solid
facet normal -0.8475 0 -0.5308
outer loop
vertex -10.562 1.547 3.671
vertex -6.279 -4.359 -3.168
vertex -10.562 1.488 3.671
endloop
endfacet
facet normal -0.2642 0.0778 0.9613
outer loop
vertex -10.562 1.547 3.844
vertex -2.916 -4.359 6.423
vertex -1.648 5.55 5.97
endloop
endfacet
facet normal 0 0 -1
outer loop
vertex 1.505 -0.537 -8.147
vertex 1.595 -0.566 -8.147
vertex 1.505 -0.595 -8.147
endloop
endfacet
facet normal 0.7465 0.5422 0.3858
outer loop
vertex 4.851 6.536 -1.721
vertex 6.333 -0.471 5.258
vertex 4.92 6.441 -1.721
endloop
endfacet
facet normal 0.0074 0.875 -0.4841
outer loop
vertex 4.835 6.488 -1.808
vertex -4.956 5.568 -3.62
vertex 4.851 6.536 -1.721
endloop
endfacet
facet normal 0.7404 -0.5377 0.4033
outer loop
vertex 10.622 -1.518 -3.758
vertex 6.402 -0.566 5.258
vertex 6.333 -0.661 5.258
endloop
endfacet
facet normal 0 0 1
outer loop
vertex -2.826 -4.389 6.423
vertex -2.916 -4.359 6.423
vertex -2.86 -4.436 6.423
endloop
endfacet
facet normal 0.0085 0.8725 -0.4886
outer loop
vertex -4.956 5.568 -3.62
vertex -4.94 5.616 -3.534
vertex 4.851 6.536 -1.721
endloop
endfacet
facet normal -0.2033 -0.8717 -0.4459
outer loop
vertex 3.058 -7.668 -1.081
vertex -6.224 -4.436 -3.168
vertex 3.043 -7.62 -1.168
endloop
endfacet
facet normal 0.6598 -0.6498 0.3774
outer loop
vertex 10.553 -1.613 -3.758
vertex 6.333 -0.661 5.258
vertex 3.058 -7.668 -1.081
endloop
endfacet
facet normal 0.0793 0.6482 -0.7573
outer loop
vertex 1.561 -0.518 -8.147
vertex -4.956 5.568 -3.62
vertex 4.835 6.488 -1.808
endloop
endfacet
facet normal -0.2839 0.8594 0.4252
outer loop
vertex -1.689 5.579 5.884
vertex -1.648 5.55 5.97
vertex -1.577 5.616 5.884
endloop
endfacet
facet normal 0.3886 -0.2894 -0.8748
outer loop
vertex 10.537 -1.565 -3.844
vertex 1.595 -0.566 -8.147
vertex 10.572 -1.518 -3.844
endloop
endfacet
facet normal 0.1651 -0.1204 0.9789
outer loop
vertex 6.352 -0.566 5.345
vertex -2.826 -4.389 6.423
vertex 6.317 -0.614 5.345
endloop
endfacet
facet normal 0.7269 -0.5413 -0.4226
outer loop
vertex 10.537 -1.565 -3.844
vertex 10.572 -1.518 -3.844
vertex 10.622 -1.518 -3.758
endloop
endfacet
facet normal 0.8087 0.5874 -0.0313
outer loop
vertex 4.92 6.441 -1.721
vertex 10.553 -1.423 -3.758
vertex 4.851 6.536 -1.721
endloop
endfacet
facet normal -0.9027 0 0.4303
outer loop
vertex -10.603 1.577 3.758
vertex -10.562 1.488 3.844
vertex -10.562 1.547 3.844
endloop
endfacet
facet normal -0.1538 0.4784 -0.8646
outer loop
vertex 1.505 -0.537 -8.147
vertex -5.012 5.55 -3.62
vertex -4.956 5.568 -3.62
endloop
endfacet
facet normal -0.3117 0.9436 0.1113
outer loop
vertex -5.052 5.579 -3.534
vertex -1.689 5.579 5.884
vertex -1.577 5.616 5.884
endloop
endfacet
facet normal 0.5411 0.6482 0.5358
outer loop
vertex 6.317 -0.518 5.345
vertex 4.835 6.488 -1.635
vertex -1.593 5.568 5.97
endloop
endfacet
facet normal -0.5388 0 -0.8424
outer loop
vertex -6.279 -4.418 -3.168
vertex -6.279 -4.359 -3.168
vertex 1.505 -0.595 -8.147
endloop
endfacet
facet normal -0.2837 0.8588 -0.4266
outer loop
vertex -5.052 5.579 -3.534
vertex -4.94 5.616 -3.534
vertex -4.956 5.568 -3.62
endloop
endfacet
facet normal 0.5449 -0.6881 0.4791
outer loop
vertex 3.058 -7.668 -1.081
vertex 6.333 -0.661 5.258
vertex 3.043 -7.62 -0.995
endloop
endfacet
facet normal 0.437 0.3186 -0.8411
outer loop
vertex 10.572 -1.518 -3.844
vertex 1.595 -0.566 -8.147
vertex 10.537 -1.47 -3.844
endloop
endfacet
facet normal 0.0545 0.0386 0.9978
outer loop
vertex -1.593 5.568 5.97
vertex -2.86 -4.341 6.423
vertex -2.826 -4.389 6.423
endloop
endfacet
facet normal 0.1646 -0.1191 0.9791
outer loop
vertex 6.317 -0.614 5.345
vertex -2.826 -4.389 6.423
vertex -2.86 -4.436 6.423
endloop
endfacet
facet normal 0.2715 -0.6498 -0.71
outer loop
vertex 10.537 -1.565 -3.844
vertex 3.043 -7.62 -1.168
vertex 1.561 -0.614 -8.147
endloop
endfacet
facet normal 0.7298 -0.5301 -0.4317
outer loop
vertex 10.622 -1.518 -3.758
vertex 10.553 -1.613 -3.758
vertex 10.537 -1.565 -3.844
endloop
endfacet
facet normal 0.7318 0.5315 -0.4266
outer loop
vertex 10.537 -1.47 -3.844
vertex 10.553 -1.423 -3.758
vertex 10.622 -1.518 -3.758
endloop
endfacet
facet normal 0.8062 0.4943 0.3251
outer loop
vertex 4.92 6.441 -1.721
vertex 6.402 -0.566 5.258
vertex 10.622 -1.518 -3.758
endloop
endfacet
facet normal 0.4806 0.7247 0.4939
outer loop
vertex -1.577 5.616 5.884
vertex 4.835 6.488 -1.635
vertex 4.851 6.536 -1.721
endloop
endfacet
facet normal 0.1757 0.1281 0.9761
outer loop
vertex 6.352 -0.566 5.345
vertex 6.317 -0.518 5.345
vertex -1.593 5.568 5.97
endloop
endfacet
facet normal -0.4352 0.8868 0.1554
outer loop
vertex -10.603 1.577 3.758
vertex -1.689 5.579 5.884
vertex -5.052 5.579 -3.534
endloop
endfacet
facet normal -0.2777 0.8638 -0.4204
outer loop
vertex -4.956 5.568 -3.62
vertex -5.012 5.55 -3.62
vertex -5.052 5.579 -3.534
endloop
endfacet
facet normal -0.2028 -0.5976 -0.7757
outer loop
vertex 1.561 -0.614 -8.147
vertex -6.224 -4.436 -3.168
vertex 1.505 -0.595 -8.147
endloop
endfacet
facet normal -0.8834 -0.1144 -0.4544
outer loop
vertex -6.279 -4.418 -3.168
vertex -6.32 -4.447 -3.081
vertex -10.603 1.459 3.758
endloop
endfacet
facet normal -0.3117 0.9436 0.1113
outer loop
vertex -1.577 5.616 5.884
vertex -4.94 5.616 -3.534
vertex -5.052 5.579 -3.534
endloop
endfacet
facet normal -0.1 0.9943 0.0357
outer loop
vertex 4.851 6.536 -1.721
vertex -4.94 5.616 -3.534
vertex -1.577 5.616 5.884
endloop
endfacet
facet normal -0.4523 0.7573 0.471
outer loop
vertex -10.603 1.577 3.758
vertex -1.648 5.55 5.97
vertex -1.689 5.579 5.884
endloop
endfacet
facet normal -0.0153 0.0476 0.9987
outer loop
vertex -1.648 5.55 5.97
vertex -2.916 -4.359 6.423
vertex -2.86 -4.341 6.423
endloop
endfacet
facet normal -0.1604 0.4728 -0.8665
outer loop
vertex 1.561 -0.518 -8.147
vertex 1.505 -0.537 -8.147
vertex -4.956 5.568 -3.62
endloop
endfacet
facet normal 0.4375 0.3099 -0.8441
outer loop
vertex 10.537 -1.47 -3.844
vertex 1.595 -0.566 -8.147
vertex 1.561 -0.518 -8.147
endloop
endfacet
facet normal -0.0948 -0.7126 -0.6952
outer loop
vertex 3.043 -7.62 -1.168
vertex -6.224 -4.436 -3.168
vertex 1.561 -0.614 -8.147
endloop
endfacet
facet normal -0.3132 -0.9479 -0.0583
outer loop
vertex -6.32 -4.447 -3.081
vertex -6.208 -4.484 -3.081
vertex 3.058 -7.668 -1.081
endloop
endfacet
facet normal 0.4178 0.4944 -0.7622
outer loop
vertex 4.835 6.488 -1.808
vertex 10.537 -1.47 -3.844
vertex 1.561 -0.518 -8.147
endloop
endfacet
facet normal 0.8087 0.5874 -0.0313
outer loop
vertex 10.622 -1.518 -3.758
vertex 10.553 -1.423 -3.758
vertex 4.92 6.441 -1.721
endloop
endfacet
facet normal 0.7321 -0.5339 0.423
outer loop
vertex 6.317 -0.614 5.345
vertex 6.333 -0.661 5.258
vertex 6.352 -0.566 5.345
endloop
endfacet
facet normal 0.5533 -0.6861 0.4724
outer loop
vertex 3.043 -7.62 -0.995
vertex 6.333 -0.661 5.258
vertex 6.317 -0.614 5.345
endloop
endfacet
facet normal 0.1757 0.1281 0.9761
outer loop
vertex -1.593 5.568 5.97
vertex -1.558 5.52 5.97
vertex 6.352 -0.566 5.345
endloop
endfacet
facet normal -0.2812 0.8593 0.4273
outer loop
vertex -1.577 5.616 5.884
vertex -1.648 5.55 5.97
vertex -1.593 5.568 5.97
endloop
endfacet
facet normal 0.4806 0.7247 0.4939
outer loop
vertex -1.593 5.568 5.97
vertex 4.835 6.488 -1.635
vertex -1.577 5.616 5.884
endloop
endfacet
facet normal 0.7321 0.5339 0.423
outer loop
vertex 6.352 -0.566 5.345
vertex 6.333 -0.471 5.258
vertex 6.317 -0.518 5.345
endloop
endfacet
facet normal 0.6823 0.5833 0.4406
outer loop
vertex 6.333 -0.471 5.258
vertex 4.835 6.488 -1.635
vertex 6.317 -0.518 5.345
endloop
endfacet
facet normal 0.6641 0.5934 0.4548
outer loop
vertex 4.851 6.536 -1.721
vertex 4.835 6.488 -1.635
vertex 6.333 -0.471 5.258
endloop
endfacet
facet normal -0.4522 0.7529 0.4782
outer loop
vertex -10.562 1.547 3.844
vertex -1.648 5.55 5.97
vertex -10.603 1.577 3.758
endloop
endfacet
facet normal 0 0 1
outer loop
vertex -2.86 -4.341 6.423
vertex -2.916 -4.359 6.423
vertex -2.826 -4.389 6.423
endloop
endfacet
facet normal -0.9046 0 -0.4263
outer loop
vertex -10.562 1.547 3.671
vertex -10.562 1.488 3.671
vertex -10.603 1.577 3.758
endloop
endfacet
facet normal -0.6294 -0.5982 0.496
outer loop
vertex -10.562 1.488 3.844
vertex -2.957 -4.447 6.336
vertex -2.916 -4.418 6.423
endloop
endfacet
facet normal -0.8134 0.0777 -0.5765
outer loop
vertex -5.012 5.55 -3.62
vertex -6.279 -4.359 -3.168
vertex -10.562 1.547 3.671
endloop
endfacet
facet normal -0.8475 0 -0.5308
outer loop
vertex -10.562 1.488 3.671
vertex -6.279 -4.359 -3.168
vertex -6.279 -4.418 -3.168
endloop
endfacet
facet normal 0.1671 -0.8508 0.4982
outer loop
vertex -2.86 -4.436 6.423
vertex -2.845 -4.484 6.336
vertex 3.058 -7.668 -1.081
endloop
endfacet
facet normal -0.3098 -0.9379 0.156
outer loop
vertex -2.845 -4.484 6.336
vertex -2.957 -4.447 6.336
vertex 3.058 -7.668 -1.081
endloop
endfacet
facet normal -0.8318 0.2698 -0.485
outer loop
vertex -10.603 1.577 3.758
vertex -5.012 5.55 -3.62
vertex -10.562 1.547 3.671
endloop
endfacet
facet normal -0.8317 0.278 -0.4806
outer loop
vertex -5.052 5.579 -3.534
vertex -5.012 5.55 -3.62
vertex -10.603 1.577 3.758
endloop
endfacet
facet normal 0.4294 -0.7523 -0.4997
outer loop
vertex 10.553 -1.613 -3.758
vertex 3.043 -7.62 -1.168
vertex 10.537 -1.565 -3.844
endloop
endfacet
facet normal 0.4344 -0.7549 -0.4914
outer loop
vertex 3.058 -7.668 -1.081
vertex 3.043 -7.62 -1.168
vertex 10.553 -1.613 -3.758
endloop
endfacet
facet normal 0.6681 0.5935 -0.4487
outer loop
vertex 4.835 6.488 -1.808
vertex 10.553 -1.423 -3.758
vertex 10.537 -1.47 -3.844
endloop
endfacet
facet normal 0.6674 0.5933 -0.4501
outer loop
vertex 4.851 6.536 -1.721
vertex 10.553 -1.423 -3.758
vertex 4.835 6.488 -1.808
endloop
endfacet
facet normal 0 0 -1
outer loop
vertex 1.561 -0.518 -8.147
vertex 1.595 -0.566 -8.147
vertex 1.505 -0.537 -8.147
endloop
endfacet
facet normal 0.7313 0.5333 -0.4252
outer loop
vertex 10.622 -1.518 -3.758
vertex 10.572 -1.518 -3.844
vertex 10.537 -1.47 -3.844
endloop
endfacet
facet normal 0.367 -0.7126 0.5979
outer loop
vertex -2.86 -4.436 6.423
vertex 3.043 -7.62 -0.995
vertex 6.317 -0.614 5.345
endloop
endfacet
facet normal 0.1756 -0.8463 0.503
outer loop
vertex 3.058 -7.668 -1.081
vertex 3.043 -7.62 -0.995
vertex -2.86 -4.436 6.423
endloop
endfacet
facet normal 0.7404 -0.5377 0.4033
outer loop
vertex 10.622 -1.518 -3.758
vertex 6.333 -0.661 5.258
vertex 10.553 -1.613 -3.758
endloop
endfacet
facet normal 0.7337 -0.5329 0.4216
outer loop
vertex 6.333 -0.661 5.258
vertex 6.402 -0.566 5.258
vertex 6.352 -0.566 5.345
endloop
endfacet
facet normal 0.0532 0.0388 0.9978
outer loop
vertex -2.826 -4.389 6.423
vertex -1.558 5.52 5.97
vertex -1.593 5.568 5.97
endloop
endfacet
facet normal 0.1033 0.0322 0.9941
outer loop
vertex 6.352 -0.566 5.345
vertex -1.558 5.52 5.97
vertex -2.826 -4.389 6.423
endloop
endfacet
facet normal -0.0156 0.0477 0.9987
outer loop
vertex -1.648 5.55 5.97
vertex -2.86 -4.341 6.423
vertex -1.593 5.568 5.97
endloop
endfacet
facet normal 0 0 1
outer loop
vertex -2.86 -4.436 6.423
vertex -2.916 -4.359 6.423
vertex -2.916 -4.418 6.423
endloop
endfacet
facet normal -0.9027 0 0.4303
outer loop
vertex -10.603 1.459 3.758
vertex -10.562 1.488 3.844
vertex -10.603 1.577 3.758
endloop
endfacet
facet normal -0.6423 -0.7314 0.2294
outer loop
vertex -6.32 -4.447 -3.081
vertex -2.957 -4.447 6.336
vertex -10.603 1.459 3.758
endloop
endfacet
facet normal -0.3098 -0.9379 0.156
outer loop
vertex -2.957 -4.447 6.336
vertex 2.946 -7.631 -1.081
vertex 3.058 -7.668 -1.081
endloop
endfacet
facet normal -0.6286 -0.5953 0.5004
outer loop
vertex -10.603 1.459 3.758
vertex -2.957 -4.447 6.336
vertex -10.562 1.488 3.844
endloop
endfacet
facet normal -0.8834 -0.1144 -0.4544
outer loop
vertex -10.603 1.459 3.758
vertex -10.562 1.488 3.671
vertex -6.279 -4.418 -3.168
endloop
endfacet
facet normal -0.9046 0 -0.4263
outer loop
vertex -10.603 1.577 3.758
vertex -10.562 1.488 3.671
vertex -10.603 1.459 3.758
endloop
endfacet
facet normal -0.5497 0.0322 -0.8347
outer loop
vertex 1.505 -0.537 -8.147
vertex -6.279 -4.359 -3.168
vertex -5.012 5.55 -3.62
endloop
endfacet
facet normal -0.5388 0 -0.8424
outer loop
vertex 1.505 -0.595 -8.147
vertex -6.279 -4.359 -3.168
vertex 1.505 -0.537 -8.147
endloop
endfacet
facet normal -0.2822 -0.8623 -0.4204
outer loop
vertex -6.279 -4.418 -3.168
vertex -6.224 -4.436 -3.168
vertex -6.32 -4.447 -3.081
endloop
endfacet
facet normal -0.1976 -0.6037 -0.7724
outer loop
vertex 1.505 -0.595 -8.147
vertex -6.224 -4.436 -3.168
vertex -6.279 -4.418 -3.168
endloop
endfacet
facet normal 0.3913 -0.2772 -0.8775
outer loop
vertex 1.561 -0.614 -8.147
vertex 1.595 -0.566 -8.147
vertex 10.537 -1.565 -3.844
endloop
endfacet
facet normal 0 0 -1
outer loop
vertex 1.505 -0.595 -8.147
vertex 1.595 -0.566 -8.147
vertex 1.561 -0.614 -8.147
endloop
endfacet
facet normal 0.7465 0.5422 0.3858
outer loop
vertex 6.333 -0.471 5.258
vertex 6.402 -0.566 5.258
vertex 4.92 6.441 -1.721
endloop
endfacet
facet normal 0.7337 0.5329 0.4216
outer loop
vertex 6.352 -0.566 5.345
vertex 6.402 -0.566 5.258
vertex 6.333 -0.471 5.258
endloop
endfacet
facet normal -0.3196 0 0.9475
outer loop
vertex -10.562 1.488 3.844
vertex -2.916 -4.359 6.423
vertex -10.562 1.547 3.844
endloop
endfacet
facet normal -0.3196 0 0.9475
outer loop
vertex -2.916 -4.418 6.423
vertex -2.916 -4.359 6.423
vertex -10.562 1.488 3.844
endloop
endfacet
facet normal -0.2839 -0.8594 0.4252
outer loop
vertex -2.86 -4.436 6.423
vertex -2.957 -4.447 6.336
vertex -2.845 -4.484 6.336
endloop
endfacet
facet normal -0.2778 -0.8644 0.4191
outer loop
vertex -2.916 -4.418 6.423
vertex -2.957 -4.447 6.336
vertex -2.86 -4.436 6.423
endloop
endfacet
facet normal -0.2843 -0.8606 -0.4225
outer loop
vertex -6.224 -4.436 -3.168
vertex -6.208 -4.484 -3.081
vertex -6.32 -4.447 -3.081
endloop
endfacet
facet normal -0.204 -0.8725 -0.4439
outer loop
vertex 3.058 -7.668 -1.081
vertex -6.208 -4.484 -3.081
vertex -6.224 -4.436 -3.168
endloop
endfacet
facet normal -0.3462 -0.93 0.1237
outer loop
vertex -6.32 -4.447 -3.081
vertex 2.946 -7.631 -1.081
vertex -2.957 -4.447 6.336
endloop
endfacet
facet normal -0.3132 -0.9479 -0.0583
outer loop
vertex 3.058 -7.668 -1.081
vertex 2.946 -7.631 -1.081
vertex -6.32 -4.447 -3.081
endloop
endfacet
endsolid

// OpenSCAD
// Auto-generated OpenSCAD file

    inner_points = 10*[[-0.2875681422808816, -0.4388544353225138, 0.6336308416100959], [-0.4971338823635884, 0.5520446776359796, -0.35338544423409335], [-0.1608031538888441, 0.5520446776359754, 0.5883584918141553], [-0.6238988707556259, -0.4388544353225094, -0.30811309443815277], [0.630172751148139, -0.056595121156739626, 0.5257908246330256], [0.3027146294131922, -0.7572666034014188, -0.10811031314704228], [0.4819873952312796, 0.6440763610879459, -0.17213508422896023], [0.1545292734963328, -0.05659512115673354, -0.8060362220090282], [-1.0522041318881028, 0.15177639015982886, 0.3757800487328346], [1.0522041318881037, -0.15177639015983246, -0.3757800487328346]];

    outer_points = 10*[[0.6301727511481393, -0.05659512115673544, 0.5257908246330251], [0.15452927349633117, -0.05659512115673544, -0.8060362220090281], [0.30271462941319155, -0.7572666034014177, -0.10811031314703921], [0.481987395231279, 0.6440763610879467, -0.1721350842289639], [-0.28756814228088123, -0.438854435322509, 0.6336308416100982], [-0.16080315388884367, 0.5520446776359799, 0.5883584918141529], [-0.6238988707556268, -0.438854435322509, -0.3081130944381499], [-0.49713388236358924, 0.5520446776359799, -0.3533854442340952], [1.0522041318881026, -0.15177639015983246, -0.3757800487328353], [-1.0522041318881026, 0.15177639015983246, 0.3757800487328353]];

    // Convex hull for inner set (I)
    module inner_hull() {
        hull() {
            for (p = inner_points) {
                translate(p) sphere(r=0.1);
            }
        }
    }

    // Convex hull for outer set (O) minus inner hull (O \ I)
    module outer_minus_inner() {
        difference() {
            hull() {
                for (p = outer_points) {
                    translate(p) sphere(r=0.1);
                }
            }
            inner_hull(); // Subtract inner hull
        }
    }

    // Convex hull for outer set (O) minus all translated inner hulls
    module outer_minus_AllTranslationInner() {
        difference() {
            hull() {
                for (p = outer_points) {
                    translate(p) sphere(r=0.1);
                }
            }
            hull() {
                translate([0,0,50]) inner_hull();
                translate([0,0,-50]) inner_hull();
            }; // Subtract translated inner hulls
        }
    }

    // Difference between outer_minus_inner and outer_minus_AllTranslationInner
    module outer_minus_inner_diff() {
        difference() {
            // Outer minus inner
            difference() {
                hull() {
                    for (p = outer_points) {
                        translate(p) sphere(r=0.1);
                    }
                }
                inner_hull();
            }

            // Subtract Outer minus AllTranslationInner
            difference() {
                hull() {
                    for (p = outer_points) {
                        translate(p) sphere(r=0.1);
                    }
                }
                hull() {
                    translate([0,0,50]) inner_hull();
                    translate([0,0,-50]) inner_hull();
                };
            }
        }
    }

    // Rendering all with colors applied
    color([1, 0, 0, 0.5]) inner_hull(); // Transparent red
    
